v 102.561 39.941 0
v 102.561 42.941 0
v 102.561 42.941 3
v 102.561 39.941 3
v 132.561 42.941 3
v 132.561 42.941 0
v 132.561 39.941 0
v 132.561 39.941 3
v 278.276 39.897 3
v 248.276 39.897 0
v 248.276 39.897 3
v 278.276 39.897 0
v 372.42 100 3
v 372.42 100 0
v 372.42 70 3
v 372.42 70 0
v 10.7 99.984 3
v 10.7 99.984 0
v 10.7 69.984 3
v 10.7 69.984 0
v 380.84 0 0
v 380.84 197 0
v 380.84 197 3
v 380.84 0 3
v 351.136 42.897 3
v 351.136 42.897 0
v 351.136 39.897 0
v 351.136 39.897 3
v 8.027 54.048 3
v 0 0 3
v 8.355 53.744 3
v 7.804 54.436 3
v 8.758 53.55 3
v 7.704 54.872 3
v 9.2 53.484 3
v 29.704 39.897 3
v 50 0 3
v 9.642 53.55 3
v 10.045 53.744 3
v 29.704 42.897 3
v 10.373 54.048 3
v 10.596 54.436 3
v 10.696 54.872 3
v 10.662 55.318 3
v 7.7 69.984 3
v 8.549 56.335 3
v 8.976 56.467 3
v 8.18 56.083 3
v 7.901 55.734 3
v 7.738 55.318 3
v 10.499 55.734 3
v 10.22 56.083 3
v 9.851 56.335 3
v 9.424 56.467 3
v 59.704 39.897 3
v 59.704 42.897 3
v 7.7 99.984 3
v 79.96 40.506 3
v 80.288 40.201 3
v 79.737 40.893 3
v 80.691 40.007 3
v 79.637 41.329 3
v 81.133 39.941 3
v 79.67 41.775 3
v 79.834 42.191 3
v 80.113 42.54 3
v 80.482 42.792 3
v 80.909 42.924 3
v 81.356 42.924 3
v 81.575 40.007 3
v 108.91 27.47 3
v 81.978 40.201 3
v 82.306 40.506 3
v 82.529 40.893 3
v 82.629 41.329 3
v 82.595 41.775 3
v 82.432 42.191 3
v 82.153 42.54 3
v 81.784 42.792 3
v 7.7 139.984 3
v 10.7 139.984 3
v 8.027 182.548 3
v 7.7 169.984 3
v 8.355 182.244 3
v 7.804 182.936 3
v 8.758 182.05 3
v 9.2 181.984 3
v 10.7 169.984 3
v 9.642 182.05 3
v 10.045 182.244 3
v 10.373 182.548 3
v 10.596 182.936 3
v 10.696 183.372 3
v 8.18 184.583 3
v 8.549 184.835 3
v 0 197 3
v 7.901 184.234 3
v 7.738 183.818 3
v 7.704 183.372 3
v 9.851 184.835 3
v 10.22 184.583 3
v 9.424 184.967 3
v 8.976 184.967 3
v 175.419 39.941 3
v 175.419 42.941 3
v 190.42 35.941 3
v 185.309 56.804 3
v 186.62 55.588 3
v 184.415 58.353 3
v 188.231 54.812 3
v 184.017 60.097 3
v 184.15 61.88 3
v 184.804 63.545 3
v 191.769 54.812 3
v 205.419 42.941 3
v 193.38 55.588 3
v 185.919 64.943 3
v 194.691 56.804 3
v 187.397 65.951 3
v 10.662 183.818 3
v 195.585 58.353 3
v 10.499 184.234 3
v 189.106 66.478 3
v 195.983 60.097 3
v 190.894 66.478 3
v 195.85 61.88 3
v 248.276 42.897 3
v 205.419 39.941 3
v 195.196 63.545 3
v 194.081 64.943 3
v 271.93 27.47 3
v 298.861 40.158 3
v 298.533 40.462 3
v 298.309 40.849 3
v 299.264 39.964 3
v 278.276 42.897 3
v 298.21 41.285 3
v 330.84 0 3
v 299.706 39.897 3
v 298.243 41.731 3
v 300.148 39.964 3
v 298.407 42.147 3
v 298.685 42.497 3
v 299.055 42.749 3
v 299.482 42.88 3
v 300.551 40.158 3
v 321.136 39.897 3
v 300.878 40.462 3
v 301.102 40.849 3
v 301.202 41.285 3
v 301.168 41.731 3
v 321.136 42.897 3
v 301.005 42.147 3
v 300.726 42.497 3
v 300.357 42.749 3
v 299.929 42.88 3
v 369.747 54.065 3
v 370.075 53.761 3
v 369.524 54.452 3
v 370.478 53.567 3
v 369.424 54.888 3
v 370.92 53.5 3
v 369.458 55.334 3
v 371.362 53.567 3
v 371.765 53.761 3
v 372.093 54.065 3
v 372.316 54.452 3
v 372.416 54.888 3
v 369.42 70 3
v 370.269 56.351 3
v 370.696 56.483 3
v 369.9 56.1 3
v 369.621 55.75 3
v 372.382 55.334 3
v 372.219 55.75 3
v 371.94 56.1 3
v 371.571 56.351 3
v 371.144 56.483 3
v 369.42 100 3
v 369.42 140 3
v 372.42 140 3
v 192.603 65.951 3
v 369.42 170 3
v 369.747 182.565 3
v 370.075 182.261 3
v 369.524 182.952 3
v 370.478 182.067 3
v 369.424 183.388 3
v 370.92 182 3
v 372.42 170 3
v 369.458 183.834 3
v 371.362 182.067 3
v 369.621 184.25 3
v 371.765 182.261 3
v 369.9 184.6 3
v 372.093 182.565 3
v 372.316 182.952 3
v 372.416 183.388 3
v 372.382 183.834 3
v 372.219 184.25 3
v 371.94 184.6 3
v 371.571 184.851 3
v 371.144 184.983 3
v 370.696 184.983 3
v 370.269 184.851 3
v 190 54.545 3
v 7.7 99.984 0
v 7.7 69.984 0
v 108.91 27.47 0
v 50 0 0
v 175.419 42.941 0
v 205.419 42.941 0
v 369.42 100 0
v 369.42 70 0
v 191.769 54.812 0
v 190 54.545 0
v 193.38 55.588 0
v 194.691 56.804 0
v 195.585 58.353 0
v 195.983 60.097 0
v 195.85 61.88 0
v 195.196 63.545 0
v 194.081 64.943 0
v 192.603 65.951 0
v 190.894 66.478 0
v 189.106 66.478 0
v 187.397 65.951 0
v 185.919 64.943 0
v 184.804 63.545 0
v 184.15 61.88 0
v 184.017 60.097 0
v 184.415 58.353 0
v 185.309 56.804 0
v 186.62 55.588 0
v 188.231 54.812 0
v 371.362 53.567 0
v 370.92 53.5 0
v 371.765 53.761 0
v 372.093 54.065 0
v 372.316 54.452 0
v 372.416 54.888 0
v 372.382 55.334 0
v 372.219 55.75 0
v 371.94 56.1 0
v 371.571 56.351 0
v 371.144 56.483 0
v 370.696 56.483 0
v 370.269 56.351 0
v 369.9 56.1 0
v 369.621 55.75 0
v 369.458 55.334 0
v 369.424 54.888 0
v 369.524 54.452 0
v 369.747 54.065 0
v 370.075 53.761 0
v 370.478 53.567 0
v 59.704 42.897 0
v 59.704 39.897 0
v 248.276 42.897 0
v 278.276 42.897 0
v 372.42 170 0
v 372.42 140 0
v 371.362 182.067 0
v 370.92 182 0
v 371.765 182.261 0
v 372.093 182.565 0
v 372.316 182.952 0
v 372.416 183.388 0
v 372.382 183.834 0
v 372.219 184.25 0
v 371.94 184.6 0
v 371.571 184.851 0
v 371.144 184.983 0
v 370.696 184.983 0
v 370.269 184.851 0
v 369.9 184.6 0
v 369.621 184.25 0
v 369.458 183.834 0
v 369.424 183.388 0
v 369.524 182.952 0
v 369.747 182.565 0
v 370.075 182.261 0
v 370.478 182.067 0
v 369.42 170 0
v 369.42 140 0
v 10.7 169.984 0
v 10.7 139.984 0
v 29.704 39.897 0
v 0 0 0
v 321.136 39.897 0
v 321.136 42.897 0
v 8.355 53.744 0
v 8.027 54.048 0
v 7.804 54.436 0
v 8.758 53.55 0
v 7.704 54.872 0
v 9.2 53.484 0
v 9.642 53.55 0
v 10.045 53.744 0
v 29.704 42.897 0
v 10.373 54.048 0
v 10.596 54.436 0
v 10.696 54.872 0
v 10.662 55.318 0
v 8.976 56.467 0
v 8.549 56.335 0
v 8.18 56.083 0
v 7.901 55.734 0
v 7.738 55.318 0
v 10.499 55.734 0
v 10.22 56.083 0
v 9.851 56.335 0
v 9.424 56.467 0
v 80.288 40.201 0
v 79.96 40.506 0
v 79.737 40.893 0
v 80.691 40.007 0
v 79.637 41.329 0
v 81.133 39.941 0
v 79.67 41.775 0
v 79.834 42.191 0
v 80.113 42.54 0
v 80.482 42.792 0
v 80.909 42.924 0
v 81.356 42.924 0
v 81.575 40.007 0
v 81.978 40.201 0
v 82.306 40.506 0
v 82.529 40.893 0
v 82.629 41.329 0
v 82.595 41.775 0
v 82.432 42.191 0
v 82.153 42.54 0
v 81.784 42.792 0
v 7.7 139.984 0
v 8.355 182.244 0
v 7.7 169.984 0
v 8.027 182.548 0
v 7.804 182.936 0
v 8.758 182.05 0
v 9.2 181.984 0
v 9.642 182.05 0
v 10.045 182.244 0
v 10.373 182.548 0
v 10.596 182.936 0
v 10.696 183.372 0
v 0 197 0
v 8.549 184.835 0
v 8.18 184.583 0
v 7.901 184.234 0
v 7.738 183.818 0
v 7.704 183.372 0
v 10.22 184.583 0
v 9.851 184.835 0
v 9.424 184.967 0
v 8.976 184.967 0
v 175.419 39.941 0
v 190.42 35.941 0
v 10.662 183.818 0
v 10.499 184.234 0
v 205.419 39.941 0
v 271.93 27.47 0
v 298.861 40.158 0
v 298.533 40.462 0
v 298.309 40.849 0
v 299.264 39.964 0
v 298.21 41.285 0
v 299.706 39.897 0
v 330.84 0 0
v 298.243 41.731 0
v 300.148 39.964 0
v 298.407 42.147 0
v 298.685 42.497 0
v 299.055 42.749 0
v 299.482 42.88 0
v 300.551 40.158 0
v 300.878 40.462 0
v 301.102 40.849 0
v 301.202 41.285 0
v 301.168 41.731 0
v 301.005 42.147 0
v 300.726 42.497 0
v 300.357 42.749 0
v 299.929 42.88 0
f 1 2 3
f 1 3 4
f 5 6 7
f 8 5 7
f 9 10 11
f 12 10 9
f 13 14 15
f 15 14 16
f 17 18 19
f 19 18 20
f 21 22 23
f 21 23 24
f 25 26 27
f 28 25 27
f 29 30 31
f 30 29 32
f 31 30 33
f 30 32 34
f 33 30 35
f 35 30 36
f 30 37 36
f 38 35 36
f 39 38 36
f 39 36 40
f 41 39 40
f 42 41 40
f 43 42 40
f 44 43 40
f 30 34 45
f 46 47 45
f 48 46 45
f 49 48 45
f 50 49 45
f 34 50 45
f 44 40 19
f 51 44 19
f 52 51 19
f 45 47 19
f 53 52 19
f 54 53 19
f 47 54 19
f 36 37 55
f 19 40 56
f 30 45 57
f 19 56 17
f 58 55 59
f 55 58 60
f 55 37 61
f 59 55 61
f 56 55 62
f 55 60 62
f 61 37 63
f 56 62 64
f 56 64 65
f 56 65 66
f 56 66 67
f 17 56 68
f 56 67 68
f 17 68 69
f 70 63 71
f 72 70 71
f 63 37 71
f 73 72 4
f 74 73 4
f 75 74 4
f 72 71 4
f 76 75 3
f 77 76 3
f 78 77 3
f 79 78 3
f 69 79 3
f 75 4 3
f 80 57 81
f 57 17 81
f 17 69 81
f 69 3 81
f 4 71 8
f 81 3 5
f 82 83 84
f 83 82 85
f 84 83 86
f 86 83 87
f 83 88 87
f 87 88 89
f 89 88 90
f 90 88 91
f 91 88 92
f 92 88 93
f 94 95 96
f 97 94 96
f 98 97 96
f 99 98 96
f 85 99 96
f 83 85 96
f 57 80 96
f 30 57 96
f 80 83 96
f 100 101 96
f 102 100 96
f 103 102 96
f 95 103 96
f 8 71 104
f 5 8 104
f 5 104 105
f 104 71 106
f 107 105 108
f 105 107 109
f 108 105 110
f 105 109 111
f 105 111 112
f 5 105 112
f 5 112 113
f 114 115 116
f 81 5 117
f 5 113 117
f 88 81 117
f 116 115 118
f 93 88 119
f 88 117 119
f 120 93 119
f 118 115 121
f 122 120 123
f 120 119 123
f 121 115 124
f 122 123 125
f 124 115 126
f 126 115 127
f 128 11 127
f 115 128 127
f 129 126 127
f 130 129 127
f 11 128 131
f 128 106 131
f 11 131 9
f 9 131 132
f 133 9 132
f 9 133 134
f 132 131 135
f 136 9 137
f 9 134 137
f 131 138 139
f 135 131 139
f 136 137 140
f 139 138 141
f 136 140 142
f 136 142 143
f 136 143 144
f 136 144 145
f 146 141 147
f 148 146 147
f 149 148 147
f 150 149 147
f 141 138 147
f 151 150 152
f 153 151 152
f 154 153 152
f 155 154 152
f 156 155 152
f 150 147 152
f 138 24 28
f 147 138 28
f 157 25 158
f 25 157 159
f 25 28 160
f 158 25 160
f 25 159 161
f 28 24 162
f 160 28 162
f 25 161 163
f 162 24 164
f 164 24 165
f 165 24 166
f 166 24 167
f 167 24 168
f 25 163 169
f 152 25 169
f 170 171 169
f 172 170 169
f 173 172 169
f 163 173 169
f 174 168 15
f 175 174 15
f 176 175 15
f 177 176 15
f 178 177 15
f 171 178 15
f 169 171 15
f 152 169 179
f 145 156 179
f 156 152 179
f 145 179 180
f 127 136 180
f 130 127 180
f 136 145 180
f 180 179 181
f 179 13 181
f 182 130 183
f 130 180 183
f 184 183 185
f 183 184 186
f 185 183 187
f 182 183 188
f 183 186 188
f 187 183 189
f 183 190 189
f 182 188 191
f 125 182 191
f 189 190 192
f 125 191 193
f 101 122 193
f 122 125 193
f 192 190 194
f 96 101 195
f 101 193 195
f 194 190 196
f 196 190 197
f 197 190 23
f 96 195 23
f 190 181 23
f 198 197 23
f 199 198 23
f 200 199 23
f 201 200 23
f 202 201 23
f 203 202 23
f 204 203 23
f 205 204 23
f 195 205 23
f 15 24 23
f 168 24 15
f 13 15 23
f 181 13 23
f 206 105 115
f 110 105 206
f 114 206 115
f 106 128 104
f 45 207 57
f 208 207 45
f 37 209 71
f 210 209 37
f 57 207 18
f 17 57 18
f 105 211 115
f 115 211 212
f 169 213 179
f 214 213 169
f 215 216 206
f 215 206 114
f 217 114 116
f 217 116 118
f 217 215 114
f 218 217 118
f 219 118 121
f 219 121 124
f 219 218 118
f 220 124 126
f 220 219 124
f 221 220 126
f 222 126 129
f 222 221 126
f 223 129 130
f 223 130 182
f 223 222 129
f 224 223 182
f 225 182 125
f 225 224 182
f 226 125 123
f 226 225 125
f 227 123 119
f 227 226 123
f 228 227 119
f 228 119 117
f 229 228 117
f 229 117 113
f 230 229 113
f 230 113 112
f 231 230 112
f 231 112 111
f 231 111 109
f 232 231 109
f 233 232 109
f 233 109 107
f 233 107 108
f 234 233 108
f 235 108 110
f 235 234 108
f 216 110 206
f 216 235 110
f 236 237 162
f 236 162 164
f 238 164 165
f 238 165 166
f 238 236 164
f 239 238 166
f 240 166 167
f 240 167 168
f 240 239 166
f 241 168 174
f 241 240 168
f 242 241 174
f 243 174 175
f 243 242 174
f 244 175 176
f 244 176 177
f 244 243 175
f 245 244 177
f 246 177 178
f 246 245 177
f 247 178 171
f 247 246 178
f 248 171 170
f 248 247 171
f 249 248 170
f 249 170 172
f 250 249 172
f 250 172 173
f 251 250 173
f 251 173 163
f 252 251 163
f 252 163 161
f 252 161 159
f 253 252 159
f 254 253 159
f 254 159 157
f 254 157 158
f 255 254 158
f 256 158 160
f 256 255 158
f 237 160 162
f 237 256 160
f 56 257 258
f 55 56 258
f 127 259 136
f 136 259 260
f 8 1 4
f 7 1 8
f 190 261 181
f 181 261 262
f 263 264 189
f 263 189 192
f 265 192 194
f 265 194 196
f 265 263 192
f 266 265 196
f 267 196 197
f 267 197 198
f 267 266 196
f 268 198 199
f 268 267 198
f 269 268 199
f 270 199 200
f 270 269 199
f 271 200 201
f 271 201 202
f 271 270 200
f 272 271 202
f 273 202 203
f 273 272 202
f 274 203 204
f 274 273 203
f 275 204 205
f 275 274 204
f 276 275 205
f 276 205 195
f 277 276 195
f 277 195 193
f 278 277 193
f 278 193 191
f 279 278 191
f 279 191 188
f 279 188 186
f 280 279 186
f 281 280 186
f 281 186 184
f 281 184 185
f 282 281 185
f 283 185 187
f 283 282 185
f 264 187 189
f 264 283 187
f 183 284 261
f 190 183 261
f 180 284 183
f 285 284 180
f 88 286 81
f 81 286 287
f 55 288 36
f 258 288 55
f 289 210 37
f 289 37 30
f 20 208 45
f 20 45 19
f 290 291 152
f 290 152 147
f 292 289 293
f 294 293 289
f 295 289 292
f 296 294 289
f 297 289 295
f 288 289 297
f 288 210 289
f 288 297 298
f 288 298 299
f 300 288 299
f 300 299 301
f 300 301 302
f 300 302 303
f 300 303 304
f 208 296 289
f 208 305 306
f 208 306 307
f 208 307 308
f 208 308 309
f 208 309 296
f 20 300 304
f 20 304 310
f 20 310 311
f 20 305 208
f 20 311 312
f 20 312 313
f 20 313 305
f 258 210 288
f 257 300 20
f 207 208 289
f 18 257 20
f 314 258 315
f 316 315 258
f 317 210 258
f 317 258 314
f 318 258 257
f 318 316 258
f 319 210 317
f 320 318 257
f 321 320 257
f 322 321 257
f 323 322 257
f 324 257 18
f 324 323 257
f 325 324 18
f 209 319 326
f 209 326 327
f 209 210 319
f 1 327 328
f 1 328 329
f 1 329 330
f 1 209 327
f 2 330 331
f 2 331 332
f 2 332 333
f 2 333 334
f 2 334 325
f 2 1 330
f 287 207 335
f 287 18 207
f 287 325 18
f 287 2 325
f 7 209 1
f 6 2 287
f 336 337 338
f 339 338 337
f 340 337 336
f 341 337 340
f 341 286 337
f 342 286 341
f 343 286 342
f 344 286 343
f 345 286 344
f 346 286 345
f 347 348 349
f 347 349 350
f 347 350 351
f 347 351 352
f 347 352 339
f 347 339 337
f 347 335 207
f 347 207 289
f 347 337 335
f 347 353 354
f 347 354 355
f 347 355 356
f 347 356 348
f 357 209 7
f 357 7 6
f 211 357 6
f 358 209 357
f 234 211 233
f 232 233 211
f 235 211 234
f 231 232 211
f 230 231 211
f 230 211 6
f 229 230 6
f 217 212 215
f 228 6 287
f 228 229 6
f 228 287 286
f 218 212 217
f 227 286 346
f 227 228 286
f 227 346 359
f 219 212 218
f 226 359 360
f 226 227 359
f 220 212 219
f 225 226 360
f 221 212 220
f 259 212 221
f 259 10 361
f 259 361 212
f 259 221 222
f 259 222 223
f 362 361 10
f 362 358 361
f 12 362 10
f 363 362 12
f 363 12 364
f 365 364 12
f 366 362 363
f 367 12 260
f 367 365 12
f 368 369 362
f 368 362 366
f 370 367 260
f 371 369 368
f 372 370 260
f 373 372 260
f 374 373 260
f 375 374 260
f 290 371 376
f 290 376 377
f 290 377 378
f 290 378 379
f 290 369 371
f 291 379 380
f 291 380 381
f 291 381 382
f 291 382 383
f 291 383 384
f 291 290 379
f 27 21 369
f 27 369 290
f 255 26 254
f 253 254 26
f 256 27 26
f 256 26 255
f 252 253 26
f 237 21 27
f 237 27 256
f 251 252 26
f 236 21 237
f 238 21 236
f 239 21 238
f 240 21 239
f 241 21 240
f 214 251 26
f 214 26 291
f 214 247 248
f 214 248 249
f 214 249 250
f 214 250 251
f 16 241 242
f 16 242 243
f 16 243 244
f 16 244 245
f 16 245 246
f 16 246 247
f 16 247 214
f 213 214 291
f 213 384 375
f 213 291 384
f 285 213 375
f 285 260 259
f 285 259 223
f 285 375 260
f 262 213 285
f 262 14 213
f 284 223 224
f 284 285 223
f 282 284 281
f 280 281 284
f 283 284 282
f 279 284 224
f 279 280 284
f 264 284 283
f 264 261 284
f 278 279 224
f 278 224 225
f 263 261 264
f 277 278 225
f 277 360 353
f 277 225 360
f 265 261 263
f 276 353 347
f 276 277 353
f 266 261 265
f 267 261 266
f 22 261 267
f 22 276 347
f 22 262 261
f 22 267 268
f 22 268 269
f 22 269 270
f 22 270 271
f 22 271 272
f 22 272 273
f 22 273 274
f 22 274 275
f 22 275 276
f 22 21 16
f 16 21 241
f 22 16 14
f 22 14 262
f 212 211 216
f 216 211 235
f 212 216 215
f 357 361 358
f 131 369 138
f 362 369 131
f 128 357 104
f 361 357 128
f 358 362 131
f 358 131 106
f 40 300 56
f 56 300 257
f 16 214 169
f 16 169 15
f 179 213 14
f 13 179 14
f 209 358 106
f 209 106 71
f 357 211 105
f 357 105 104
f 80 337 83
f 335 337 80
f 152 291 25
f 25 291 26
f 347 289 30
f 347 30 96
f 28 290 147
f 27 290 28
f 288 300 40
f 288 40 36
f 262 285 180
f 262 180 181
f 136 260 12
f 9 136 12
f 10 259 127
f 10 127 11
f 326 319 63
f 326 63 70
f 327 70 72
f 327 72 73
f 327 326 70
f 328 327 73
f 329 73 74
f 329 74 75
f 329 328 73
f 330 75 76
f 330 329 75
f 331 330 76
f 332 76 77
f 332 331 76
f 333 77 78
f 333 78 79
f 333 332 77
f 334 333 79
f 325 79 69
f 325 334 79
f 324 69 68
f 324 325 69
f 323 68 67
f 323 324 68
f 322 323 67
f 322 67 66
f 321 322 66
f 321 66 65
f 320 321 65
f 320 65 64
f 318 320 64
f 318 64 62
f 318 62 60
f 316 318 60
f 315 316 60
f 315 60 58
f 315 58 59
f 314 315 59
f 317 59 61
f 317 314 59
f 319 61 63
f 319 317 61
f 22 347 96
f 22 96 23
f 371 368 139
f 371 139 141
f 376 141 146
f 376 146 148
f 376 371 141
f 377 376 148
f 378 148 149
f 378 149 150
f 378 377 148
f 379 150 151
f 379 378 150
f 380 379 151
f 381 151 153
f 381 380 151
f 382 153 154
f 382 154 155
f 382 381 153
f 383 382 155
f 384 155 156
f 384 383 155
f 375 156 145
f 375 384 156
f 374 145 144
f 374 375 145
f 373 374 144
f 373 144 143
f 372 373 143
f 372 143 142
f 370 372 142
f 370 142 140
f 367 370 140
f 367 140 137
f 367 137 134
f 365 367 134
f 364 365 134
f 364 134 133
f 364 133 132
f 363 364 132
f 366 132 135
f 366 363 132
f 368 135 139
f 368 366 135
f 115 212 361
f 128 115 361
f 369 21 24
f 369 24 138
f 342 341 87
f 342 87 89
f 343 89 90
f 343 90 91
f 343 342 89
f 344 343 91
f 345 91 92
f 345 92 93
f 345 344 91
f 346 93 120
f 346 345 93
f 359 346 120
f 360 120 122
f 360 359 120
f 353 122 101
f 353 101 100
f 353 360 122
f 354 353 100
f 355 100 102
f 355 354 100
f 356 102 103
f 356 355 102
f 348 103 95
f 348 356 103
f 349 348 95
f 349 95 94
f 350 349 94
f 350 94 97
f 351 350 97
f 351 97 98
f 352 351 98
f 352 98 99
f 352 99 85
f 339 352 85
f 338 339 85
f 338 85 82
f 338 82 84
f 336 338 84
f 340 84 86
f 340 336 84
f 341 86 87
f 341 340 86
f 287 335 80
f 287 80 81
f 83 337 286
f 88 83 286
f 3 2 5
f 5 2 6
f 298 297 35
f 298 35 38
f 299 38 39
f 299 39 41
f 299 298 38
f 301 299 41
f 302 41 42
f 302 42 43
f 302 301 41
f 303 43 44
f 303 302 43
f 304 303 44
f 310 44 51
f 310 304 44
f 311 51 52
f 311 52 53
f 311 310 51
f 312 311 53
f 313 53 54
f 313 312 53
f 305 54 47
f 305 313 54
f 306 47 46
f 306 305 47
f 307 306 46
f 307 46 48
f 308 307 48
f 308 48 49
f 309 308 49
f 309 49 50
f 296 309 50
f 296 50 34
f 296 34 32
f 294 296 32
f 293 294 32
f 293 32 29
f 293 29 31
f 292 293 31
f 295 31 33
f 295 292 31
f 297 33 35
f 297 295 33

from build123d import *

# Parameters (mm, degrees)
SKETCH1_R           = 1.5
SKETCH1_R_2         = 6
SKETCH1_W           = 30
SKETCH1_H           = 3
SKETCH1_W_2         = 3
SKETCH1_H_2         = 30
BOSS_EXTRUDE1_DEPTH = 3


with BuildPart() as part:
    # Sketch1 → Boss-Extrude1 (new body)
    with BuildSketch(Plane(origin=(-12.611770594, -16.696126479, 0), x_dir=(0, -1, 0), z_dir=(0, 0, 1))):
        Polygon((-213.696126479, 12.611770594), (-213.696126479, 393.451770594), (-16.696126479, 393.451770594), (-16.696126479, 343.451770594), (-44.166313492, 284.541764437), (-52.636925092, 203.031770594), (-44.166313492, 121.521776752), (-16.696126479, 62.611770594), (-16.696126479, 12.611770594), align=None)
        with Locations((-200.179850585, 21.811770594)):
            Circle(SKETCH1_R, mode=Mode.SUBTRACT)
        with Locations((-58.093278212, 312.31748488)):
            Circle(SKETCH1_R, mode=Mode.SUBTRACT)
        with Locations((-200.196126479, 383.531770594)):
            Circle(SKETCH1_R, mode=Mode.SUBTRACT)
        with Locations((-71.696126479, 383.531770594)):
            Circle(SKETCH1_R, mode=Mode.SUBTRACT)
        with Locations((-58.136861316, 93.744627737)):
            Circle(SKETCH1_R, mode=Mode.SUBTRACT)
        with Locations((-71.679850585, 21.811770594)):
            Circle(SKETCH1_R, mode=Mode.SUBTRACT)
        with Locations((-77.241301287, 202.611770594)):
            Circle(SKETCH1_R_2, mode=Mode.SUBTRACT)
        with Locations((-171.679850585, 21.811770594)):
            Rectangle(SKETCH1_W, SKETCH1_H, mode=Mode.SUBTRACT)
        with Locations((-101.679850585, 21.811770594)):
            Rectangle(SKETCH1_W, SKETCH1_H, mode=Mode.SUBTRACT)
        with Locations((-58.093278212, 57.316056309)):
            Rectangle(SKETCH1_W_2, SKETCH1_H_2, mode=Mode.SUBTRACT)
        with Locations((-58.136861316, 130.173199166)):
            Rectangle(SKETCH1_W_2, SKETCH1_H_2, mode=Mode.SUBTRACT)
        with Locations((-58.136925092, 203.030342023)):
            Rectangle(SKETCH1_W_2, SKETCH1_H_2, mode=Mode.SUBTRACT)
        with Locations((-58.093278212, 275.88748488)):
            Rectangle(SKETCH1_W_2, SKETCH1_H_2, mode=Mode.SUBTRACT)
        with Locations((-58.093278212, 348.74748488)):
            Rectangle(SKETCH1_W_2, SKETCH1_H_2, mode=Mode.SUBTRACT)
        with Locations((-101.696126479, 383.531770594)):
            Rectangle(SKETCH1_W, SKETCH1_H, mode=Mode.SUBTRACT)
        with Locations((-171.696126479, 383.531770594)):
            Rectangle(SKETCH1_W, SKETCH1_H, mode=Mode.SUBTRACT)
    extrude(amount=BOSS_EXTRUDE1_DEPTH)


solid = part.part
